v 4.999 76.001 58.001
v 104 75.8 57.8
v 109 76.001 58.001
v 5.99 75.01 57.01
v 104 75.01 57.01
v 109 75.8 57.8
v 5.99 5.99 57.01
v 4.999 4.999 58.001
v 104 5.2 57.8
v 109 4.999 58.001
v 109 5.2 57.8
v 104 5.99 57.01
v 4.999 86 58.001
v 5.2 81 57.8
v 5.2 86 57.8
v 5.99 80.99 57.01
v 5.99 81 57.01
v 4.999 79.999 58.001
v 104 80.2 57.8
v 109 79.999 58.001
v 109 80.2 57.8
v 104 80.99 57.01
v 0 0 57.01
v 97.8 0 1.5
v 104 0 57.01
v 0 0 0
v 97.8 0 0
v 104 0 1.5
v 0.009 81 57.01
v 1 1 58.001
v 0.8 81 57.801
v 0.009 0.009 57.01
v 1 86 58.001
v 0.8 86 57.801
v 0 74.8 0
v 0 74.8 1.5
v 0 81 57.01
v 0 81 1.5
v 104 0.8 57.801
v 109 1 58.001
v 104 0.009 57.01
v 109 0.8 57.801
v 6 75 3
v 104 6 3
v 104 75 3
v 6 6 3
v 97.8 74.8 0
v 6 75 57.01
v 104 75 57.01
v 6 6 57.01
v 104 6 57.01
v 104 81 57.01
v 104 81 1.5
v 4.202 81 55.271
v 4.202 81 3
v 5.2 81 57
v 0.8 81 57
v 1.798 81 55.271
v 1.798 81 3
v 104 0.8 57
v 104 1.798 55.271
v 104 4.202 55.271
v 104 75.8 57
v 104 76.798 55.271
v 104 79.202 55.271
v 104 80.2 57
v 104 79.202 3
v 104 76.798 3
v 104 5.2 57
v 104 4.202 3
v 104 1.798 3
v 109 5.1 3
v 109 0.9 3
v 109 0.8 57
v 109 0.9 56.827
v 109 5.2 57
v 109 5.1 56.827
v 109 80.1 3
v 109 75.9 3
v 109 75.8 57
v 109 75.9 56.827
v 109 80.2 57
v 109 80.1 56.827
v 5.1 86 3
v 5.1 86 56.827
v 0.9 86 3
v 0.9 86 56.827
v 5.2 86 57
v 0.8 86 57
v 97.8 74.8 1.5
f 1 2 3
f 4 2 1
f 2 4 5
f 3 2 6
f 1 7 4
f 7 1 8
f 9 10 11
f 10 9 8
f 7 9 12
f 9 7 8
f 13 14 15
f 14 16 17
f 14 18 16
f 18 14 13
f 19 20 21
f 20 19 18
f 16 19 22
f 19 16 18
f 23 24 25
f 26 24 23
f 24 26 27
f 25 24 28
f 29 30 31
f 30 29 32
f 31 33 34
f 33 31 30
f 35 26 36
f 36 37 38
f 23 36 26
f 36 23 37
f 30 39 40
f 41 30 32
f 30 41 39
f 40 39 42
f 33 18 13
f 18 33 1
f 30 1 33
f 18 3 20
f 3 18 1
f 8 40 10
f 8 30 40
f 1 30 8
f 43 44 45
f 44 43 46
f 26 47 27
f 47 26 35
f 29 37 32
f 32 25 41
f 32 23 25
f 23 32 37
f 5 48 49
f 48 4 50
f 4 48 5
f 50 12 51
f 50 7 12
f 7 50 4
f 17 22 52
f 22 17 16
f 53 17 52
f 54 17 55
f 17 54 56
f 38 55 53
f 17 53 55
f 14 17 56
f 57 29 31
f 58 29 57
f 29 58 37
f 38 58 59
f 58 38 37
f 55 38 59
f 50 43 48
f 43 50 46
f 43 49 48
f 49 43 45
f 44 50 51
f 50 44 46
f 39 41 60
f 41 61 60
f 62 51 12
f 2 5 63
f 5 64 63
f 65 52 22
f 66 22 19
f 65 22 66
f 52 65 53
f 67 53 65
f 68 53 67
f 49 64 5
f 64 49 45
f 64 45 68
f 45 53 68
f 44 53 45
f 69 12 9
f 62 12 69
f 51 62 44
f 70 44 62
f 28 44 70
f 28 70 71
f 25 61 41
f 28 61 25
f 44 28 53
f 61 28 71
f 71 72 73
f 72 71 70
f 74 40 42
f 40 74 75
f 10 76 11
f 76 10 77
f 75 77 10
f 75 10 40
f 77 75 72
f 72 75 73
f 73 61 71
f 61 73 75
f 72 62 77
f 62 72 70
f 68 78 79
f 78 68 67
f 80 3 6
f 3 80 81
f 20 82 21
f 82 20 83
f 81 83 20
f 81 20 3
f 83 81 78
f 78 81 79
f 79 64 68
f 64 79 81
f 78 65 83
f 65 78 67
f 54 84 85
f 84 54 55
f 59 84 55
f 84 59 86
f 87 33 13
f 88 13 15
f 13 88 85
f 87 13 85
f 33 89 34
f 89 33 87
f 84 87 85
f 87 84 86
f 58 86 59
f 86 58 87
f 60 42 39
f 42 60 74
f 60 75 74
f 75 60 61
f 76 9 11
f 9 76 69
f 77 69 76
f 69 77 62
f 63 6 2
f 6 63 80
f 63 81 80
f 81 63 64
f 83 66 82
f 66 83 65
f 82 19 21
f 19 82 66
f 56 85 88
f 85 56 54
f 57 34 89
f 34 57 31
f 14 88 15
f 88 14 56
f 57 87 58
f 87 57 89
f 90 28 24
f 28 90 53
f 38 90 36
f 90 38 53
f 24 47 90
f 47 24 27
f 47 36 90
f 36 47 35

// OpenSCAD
// ============================================================================
// cutlery_box.scad
// Graduated 3-chamber disposable-cutlery box (Option 3) — CUT-FROM-SOLID port
// of build_box.py, for a 120 x 120 x 120 mm printer (AOSEED).
//
// WHY THIS PORT EXISTS (the whole point):
//   The hand-mesh generator (build_box.py) could not keep the 1 mm rim chamfer
//   continuous across the female dovetail joints, because where a slot's flared
//   corner crosses the sloped chamfer it needs a true boolean intersection.
//   OpenSCAD HAS that boolean kernel, so here we do exactly the "cut-from-solid"
//   thing:
//      1. Build the ENTIRE box as ONE solid, WITH the chamfer already on it.
//      2. difference() out vertical dovetail prisms ( /_\ cross-section ),
//         running from just above the base plate up THROUGH the rim, to both
//         (a) form the sliding-dovetail joints, and
//         (b) split the box into 6 bed-sized pieces.
//   Because the cut is a real boolean through the already-chamfered solid, the
//   sloped chamfer<->slot edge is produced for free => the rim chamfer stays
//   CONTINUOUS across every joint, with none of the sliver hacks.
//
// ----------------------------------------------------------------------------
// HOW TO USE
//   In the app:  set `part` below (or use the Customizer dropdown), F5 to
//                preview, F6 to render, then File > Export > STL.
//   One piece (CLI):
//      openscad -o body_knife_A.stl -D 'part="knife_A"' cutlery_box.scad
//   ALL SIX (bash, run from this folder):
//      for p in knife_A knife_B fork_A fork_B spoon_A spoon_B; do \
//        openscad -o "body_$p.stl" -D "part=\"$p\"" cutlery_box.scad ; done
//   PNG preview of one piece:
//      openscad -o knife_B.png --imgsize=1400,1000 --autocenter --viewall \
//        -D 'part="knife_B"' cutlery_box.scad
//
//   Pieces are modelled in ASSEMBLED coordinates (floor-down, z=0 is the bed),
//   so importing all six STLs together shows the assembled box directly; your
//   slicer will auto-drop each one onto the plate for printing.
//
// BED SANITY: every piece is <= 120 mm in X, Y, Z.
//   Z = 58 mm. Widest piece = spoon at 117 mm (Y). A-halves reach 109 mm (X,
//   including the protruding dovetail key). All under 120.
//
// !! I could NOT run OpenSCAD to verify this file (no binary in my sandbox) !!
//   - The rim chamfer is a SMOOTH, true-45 bevel built from hull() frustums of
//     convex rectangles. Works in every OpenSCAD since ~2015 (incl. Homebrew
//     2021.01). No stepped staircase -- and, crucially, it makes box() a clean
//     well-formed solid so the per-part booleans resolve reliably (the old
//     14-slice staircase was fragile and CGAL was dropping the walls of the
//     interior parts, leaving only the key prisms => "floating boxes").
//   - roof() is still available behind USE_ROOF=true for those who have it
//     (2021.01+ snapshots); for THIS rectangular design it is identical, so it
//     is NOT required.
//   - After F6, check the console for "WARNING"/"not a valid 2-manifold".
//     If a tenon ever looks detached, bump EPS to 0.05.
// ============================================================================


/* [Part to render / export] */
part = "knife_A"; // [knife_A, knife_B, fork_A, fork_B, spoon_A, spoon_B, assembly]

/* [Chamfer method] */
// false = smooth hull() frustum bevel (default, any OpenSCAD); true = roof() (2021.01+)
USE_ROOF = false;

/* [Heights (mm)] */
BASE   = 3.0;     // floor / base-plate thickness
COMP_H = 55.0;    // interior wall height above the floor (cutlery stack depth)

/* [Walls (mm)] */
HOST_T   = 6.0;     // thickness of every wall (thick enough to host a dovetail)
HALF_LEN = 104.0;   // printed length of each half (A = near, B = far); <120 incl. key

/* [Chamber bays (mm)] */
N_COL     = 3;       // columns of cutlery per chamber
KNIFE_COL = 23.0;    // -> knife bay 69  (3 x 19 mm knives + play)
FORK_COL  = 33.0;    // -> fork  bay 99  (3 x 29 mm forks  + play)
SPOON_COL = 37.0;    // -> spoon bay 111 (3 x 34 mm spoons + play, trimmed <120)

/* [Dovetail joint (mm)] */
DT_DEPTH = 5.0;   // tail protrusion past the seam (male key depth)
DT_NECK  = 1.2;   // half-width at the seam face (narrow)
DT_FLARE = 2.1;   // half-width at the tip (wide -> locks)
DT_CLR   = 0.4;   // FLANK/seam slide clearance added to the female socket (do not change for fit)
DT_DEPTH_RELIEF = 0.3; // extra depth on the socket BACK only, so the tail tip never bottoms out

/* [Hidden-dovetail top cap / "hat" (mm)] */
// The dovetail otherwise shows its trapezoid outline on the TOP edge of the wall.
// To hide it, the MALE piece extends the wall's full-width top (chamfer included)
// across the key footprint -> a flush, continuous top. The FEMALE piece gets a
// matching top RECESS (cap footprint + CAP_CLR) so the cap drops straight in.
// Result: the top reads as one surface with a single straight seam line at the cap
// tip; the dovetail joinery lives entirely below the cap.
//
// SELF-SUPPORTING UNDERSIDE: a full-width cap would overhang the narrower dovetail
// neck with a flat 90-deg shelf -> needs print support floor-down. Instead the cap
// underside RAMPS from the neck half-width (CAP_FOOT) out to its max half-width at
// CAP_SLANT_DEG from horizontal (steeper = more vertical = safer overhang). The
// FEMALE recess gets the SAME ramp (+CAP_CLR) so the cap still seats flush.
//
// ORANGE refinement: the ramp is sized so it reaches full width EXACTLY at the lower
//   chamfer line (z = BODY_H-CHAMFER). CAP_H is therefore DERIVED (see below), not set
//   here, so the "ramp top" and "chamfer base" reference lines coincide (one less step).
// GREEN refinement: the cap does NOT run to the full wall edge. It stops FEATHER_MIN+
//   CAP_CLR short, so the FEMALE keeps a >= FEATHER_MIN solid land at the wall face
//   instead of feathering to a zero-thickness knife edge. The cap is relieved to match,
//   so it still seats with CAP_CLR.
CAP_SLANT_DEG = 60;     // cap underside ramp angle from horizontal (45 = printable limit; 60 = safe margin)
CAP_FOOT = DT_NECK;     // cap-underside half-width where it meets the dovetail neck
CAP_CLR = 0.3;          // slide clearance so the male cap seats into the female top recess
FEATHER_MIN = 0.5;      // min female wall land left at the joint (kills the knife/feather edge)

/* [Rim chamfer (mm)] */
CHAMFER = 1.0;    // 45-deg comfort break broken along the top wall edges

/* [Base half-lap / anti-warp (mm)] */
// Neighbouring base plates overlap as a HORIZONTAL half-lap (shiplap) at mid-base
// height, so corners stay coplanar (no lift/protrusion). Horizontal lap faces do
// NOT bind the vertical-drop assembly. Shingle direction: A->B and knife->fork->spoon.
LAP_LEN = 6;        // overlap past the A/B seam and the knife/fork seam
LAP_LEN_FS = 2;     // overlap past the fork/SPOON seam -- SMALLER: spoon is the
                    // tightest piece (117mm of the 120mm bed); a 6mm lap there
                    // would push spoon to 123mm. 2mm keeps spoon at 119mm.
LAP_Z   = BASE/2;   // 1.5 -- horizontal split height of the lap (bottom vs top half)
LAP_CLR = 0.2;      // in-plane clearance so the shelf isn't a press fit


/* [Hidden] */
EPS      = 0.01;          // tiny overlap so abutting solids fuse cleanly in CGAL
// Upper-chamber pieces (fork, spoon) were cut by a cell plane laid EXACTLY on the
// divider wall's far face (the lower chamber owns that wall). intersection() along a
// plane coincident with an existing box face makes CGAL leave a ZERO-THICKNESS copy
// of the wall face -> edge-manifold + "watertight" but degenerate (OpenSCAD shows it
// as a blue back-face; Tinkercad thickens it into a phantom block). SEAM_EPS nudges
// those cut planes a hair INTO the open bay so they no longer coincide with any box
// face -> no flap. 0.02 mm is physically nothing but is well clear of CGAL's tolerance.
SEAM_EPS = 0.02;
CUT_OVER = 1.0;           // how far dovetail cutters overshoot the rim (clean cut)

BODY_H    = BASE + COMP_H;     // 58  total height
END_WALL  = HOST_T;            // end walls are dovetail hosts too -> equally thick
TOTAL_LEN = 2 * HALF_LEN;      // 208 assembled length (end wall .. end wall)

// hidden-cap ramp geometry (derived).
//   CAP_HW    = cap MAX half-width. GREEN: stops FEATHER_MIN+CAP_CLR short of the wall
//               edge so the female keeps a >=FEATHER_MIN solid land (no feather edge).
//   CAP_RISE  = vertical height of the self-supporting 60-deg underside ramp.
//   CAP_ZRAMP = where the cap reaches full width. ORANGE: pinned to the chamfer base
//               (BODY_H-CHAMFER) so "ramp top" and "chamfer base" are the SAME line.
//   CAP_ZBOT  = cap bottom = ramp start; CAP_H derived from it (for reference/report).
//   CAP_ZRAMP_R = recess ramp top, shifted down by CAP_CLR so the recess ramp stays
//               parallel to the cap ramp with uniform clearance.
CAP_HW      = HOST_T/2 - FEATHER_MIN - CAP_CLR;
CAP_RISE    = (CAP_HW - CAP_FOOT) * tan(CAP_SLANT_DEG);
CAP_ZRAMP   = BODY_H - CHAMFER;               // ORANGE: full width exactly at the chamfer base
CAP_ZBOT    = CAP_ZRAMP - CAP_RISE;
CAP_H       = BODY_H - CAP_ZBOT;              // derived; reported
CAP_ZRAMP_R = (CAP_ZBOT - CAP_CLR) + CAP_RISE;
// sanity checks
assert(CAP_ZBOT > BASE + 1,
       "cap zone dips too low -- reduce CAP_SLANT_DEG or FEATHER_MIN");
assert(CAP_HW >= DT_FLARE,
       "cap too narrow to cover the dovetail tail -- reduce FEATHER_MIN or CAP_CLR");

// bay widths
KNIFE_BAY = N_COL * KNIFE_COL; // 69
FORK_BAY  = N_COL * FORK_COL;  // 99
SPOON_BAY = N_COL * SPOON_COL; // 111

// ---- Y layout (width direction): wall | bay | divider | bay | divider | bay | wall
KNIFE_Y0 = 0;
KNIFE_Y1 = HOST_T + KNIFE_BAY + HOST_T;        // 0..81   (outer wall + bay + divider)
FORK_Y0  = KNIFE_Y1;                           // 81
FORK_Y1  = FORK_Y0 + FORK_BAY + HOST_T;        // 81..186 (bay + divider)
SPOON_Y0 = FORK_Y1;                            // 186
SPOON_Y1 = SPOON_Y0 + SPOON_BAY + HOST_T;      // 186..303(bay + outer wall)
EXT_W    = SPOON_Y1;                           // 303 total width

// lengthwise wall Y-bands [y0,y1] (host the A/B dovetails) + their centers
OUTER_L  = [0, HOST_T];                                       // [0,6]    c=3
DIV_KF   = [HOST_T + KNIFE_BAY, HOST_T + KNIFE_BAY + HOST_T]; // [75,81]  c=78
DIV_FS   = [FORK_Y0 + FORK_BAY, FORK_Y0 + FORK_BAY + HOST_T]; // [180,186]c=183
OUTER_R  = [SPOON_Y1 - HOST_T, SPOON_Y1];                     // [297,303]c=300

// the three OPEN bays are rectangular holes in the wall footprint:
//   footprint = outer rectangle MINUS these bays  (== the 6 walls; verified).
// The smooth chamfer is built from exactly this decomposition.
BAY_X0 = END_WALL;              // 6
BAY_X1 = TOTAL_LEN - END_WALL;  // 202
BAYS = [
    [BAY_X0, BAY_X1, HOST_T,   HOST_T + KNIFE_BAY],   // knife bay [6,202] x [6,75]
    [BAY_X0, BAY_X1, FORK_Y0,  FORK_Y0 + FORK_BAY],   // fork  bay [6,202] x [81,180]
    [BAY_X0, BAY_X1, SPOON_Y0, SPOON_Y0 + SPOON_BAY], // spoon bay [6,202] x [186,297]
];

YC_OUTL  = OUTER_L[0] + HOST_T/2;   // 3   outer-left wall center
YC_DIVKF = DIV_KF[0]  + HOST_T/2;   // 78  knife/fork divider center
YC_DIVFS = DIV_FS[0]  + HOST_T/2;   // 183 fork/spoon divider center
YC_OUTR  = OUTER_R[0] + HOST_T/2;   // 300 outer-right wall center

// seams
AB_SEAM = HALF_LEN;               // 104  A/B length seam (x)
SEAM_KF = FORK_Y0;                // 81   knife/fork width seam (y)
SEAM_FS = SPOON_Y0;              // 186  fork/spoon width seam (y)
ENDC_A  = END_WALL/2;             // 3    A end-wall center (x) -> chamber dovetails
ENDC_B  = TOTAL_LEN - END_WALL/2; // 205  B end-wall center (x)


// ============================================================================
// 2D wall footprint (cross-section of all walls, constant in z for the straight
// part). Union of: 2 full-width end walls + 4 lengthwise walls between them.
// ============================================================================
module wall_footprint_2d() {
    // footprint = outer rectangle minus the 3 open bays  (== the 6 walls)
    difference() {
        square([TOTAL_LEN, EXT_W]);
        for (b = BAYS) translate([b[0], b[2]]) square([b[1] - b[0], b[3] - b[2]]);
    }
}

// ============================================================================
// The full chamfered box solid = base plate + walls with a continuous 1 mm
// top-rim chamfer. Built ONCE; every piece is carved out of this.
// ============================================================================
module chamfer_cap() {
    // SMOOTH 45 rim chamfer over z[BODY_H-CHAMFER, BODY_H], in absolute coords.
    zm = BODY_H - CHAMFER;
    if (USE_ROOF) {
        // exact straight-skeleton roof, capped at CHAMFER height (needs roof()).
        intersection() {
            translate([0,0,zm]) roof() wall_footprint_2d();
            translate([0,0,zm]) linear_extrude(CHAMFER + EPS) wall_footprint_2d();
        }
    } else {
        // DEFAULT: true 45 bevel as hull() frustums of CONVEX rectangles -> smooth
        // AND a clean manifold.  Since footprint = outer - bays, the chamfer of the
        // footprint = (outer rectangle beveled inward) MINUS (each bay beveled so it
        // grows toward the top, which bevels every bay-facing rim).  All hull()s are
        // on convex rectangles, so nothing gets convex-filled.
        difference() {
            // outer perimeter frustum: full outer rect at zm -> inset by CHAMFER at top
            hull() {
                translate([0,0,zm])     linear_extrude(0.001) square([TOTAL_LEN, EXT_W]);
                translate([0,0,BODY_H]) linear_extrude(0.001) offset(delta=-CHAMFER) square([TOTAL_LEN, EXT_W]);
            }
            // each bay grows by CHAMFER toward the top -> bevels its surrounding rim.
            // (overshoots z a hair past both ends so the cut is clean.)
            for (b = BAYS)
                hull() {
                    translate([0,0,zm-EPS])     linear_extrude(0.001)
                        translate([b[0],b[2]]) offset(delta=-EPS)        square([b[1]-b[0], b[3]-b[2]]);
                    translate([0,0,BODY_H+EPS]) linear_extrude(0.001)
                        translate([b[0],b[2]]) offset(delta=CHAMFER+EPS) square([b[1]-b[0], b[3]-b[2]]);
                }
        }
    }
}

module box() {
    zm = BODY_H - CHAMFER;
    union() {
        cube([TOTAL_LEN, EXT_W, BASE]);                                        // base plate z[0,3]
        translate([0,0,BASE]) linear_extrude(zm - BASE + EPS) wall_footprint_2d(); // straight walls z[3,57]
        chamfer_cap();                                                         // smooth chamfer z[57,58]
    }
}

// ============================================================================
// Dovetail prisms ( /_\ ). Vertical, z[BASE, BODY_H+CUT_OVER] so they cut
// through the rim but leave the base plate continuous. The near face is pushed
// back EPS so a male key always fuses to its wall.
//   male key   : half_n=DT_NECK,         half_f=DT_FLARE
//   female slot: half_n=DT_NECK+DT_CLR,  half_f=DT_FLARE+DT_CLR
// ============================================================================
module dt_prism_X(seam_x, yc, half_n, half_f) {   // perpendicular to X, grows +X
    translate([0,0,BASE]) linear_extrude(BODY_H - BASE + CUT_OVER)
        polygon([[seam_x - EPS,        yc - half_n],
                 [seam_x + DT_DEPTH,   yc - half_f],
                 [seam_x + DT_DEPTH,   yc + half_f],
                 [seam_x - EPS,        yc + half_n]]);
}
module dt_prism_Y(seam_y, xc, half_n, half_f) {   // perpendicular to Y, grows +Y
    translate([0,0,BASE]) linear_extrude(BODY_H - BASE + CUT_OVER)
        polygon([[xc - half_n, seam_y - EPS],
                 [xc - half_f, seam_y + DT_DEPTH],
                 [xc + half_f, seam_y + DT_DEPTH],
                 [xc + half_n, seam_y - EPS]]);
}
module ab_key   (yc)        { dt_prism_X(AB_SEAM, yc, DT_NECK, DT_FLARE); }
module ch_key   (seam_y, xc){ dt_prism_Y(seam_y, xc, DT_NECK, DT_FLARE); }

// Female sockets = male + DT_CLR on the flanks/seam (unchanged), PLUS a straight
// back-face relief of DT_DEPTH_RELIEF so the tail tip never bottoms out. The
// relief is a rectangle tacked onto the trapezoid's tip at the SAME flare width,
// so the angled flank faces (and their 0.4 mm slide clearance) are untouched.
module ab_socket(yc) {
    dt_prism_X(AB_SEAM, yc, DT_NECK + DT_CLR, DT_FLARE + DT_CLR);
    translate([0,0,BASE]) linear_extrude(BODY_H - BASE + CUT_OVER)
        translate([AB_SEAM + DT_DEPTH, yc - (DT_FLARE + DT_CLR)])
            square([DT_DEPTH_RELIEF, 2*(DT_FLARE + DT_CLR)]);          // back relief, +X
}
module ch_socket(seam_y, xc) {
    dt_prism_Y(seam_y, xc, DT_NECK + DT_CLR, DT_FLARE + DT_CLR);
    translate([0,0,BASE]) linear_extrude(BODY_H - BASE + CUT_OVER)
        translate([xc - (DT_FLARE + DT_CLR), seam_y + DT_DEPTH])
            square([2*(DT_FLARE + DT_CLR), DT_DEPTH_RELIEF]);          // back relief, +Y
}

// ===== hidden-dovetail top cap ("hat"), SELF-SUPPORTING underside ===============
// MALE cap: a NARROW hat (max half-width CAP_HW = HOST_T/2 - FEATHER_MIN - CAP_CLR) whose
// underside RAMPS from the dovetail-neck half-width (CAP_FOOT) out to CAP_HW at
// CAP_SLANT_DEG from horizontal -> a self-supporting shoulder (the "orange" edge). The
// ramp tops out at CAP_ZRAMP = BODY_H - CHAMFER (= the lower chamfer line), so the
// "ramp top" and "chamfer base" reference lines coincide ("merge C into B"). Built as
// hull(narrow bottom slab buried in the tail neck, top slab at CAP_HW through the rim);
// box() trims it to the wall and adds the rim chamfer. Staying narrow leaves a clean
// FEATHER_MIN female land (no knife edge). The protruding NOSE is left SQUARE (vertical) --
// intentionally simple; it is hidden in the female socket when assembled.
module ab_cap(yc) {   // A/B seam, grows +X past the seam (length direction)
    hull() {
        translate([AB_SEAM - EPS, yc - CAP_FOOT, CAP_ZBOT])
            cube([DT_DEPTH + EPS, 2*CAP_FOOT, EPS]);
        translate([AB_SEAM - EPS, yc - CAP_HW,   CAP_ZRAMP])
            cube([DT_DEPTH + EPS, 2*CAP_HW, (BODY_H + CUT_OVER) - CAP_ZRAMP]);
    }
}
module ch_cap(seam_y, xc) {   // chamber seam, grows +Y past the seam (in the end wall)
    hull() {
        translate([xc - CAP_FOOT, seam_y - EPS, CAP_ZBOT])
            cube([2*CAP_FOOT, DT_DEPTH + EPS, EPS]);
        translate([xc - CAP_HW,   seam_y - EPS, CAP_ZRAMP])
            cube([2*CAP_HW, DT_DEPTH + EPS, (BODY_H + CUT_OVER) - CAP_ZRAMP]);
    }
}
// FEMALE recess: the SAME ramp grown by CAP_CLR (flanks, tip, floor, and ramp shifted down
// by CAP_CLR so it stays parallel) -> the cap seats with uniform slide clearance, the wall
// keeps a >= FEATHER_MIN solid land at the joint (no feather edge), and there are no
// coincident faces. Open upward and toward the seam.
module ab_cap_neg(yc) {
    hull() {
        translate([AB_SEAM - EPS, yc - (CAP_FOOT + CAP_CLR), CAP_ZBOT - CAP_CLR])
            cube([DT_DEPTH + CAP_CLR + EPS, 2*(CAP_FOOT + CAP_CLR), EPS]);
        translate([AB_SEAM - EPS, yc - (CAP_HW + CAP_CLR), CAP_ZRAMP_R])
            cube([DT_DEPTH + CAP_CLR + EPS, 2*(CAP_HW + CAP_CLR), (BODY_H + CUT_OVER + 1) - CAP_ZRAMP_R]);
    }
}
module ch_cap_neg(seam_y, xc) {
    hull() {
        translate([xc - (CAP_FOOT + CAP_CLR), seam_y - EPS, CAP_ZBOT - CAP_CLR])
            cube([2*(CAP_FOOT + CAP_CLR), DT_DEPTH + CAP_CLR + EPS, EPS]);
        translate([xc - (CAP_HW + CAP_CLR), seam_y - EPS, CAP_ZRAMP_R])
            cube([2*(CAP_HW + CAP_CLR), DT_DEPTH + CAP_CLR + EPS, (BODY_H + CUT_OVER + 1) - CAP_ZRAMP_R]);
    }
}

// rectangular cell (x[xa,xb], y[ya,yb], full height + margin) used to split pieces
module cell(xa, xb, ya, yb) {
    translate([xa, ya, -1]) cube([xb - xa, yb - ya, BODY_H + 11]);
}

// ===== base half-lap (shiplap) =================================================
// HORIZONTAL lap at mid-base height: the shelf-owner keeps its BOTTOM half
// (z 0..LAP_Z) extending LAP_LEN past the seam; the neighbour has its bottom half
// REMOVED there (keeps only the top half) and lands flat on the shelf. Horizontal
// faces => no binding during the vertical drop. Shelves live entirely in the base
// (z < BASE), well clear of the wall dovetails (z >= BASE).
// Shingle = FEMALE-first (matches the no-notch dovetail assembly order, which
// lowers the male piece onto the female): the B half owns the A/B shelf (grows
// -X into A) and the UPPER chamber (fork, spoon) owns the chamber shelf (grows
// -Y into the lower chamber).  Order: spoon, fork, knife; B before A.
module lap_shelf_X(y0, y1) {                 // B-side shelf, grows -X into A past AB_SEAM
    // +EPS past AB_SEAM so the shelf interpenetrates (not just abuts) its own B body -> fuses cleanly.
    translate([AB_SEAM - LAP_LEN, y0, 0]) cube([LAP_LEN + EPS, y1 - y0, LAP_Z]);
}
module lap_neg_X(y0, y1) {                   // A-side: remove bottom half to receive it
    translate([AB_SEAM - LAP_LEN - LAP_CLR, y0 - EPS, -EPS])
        cube([LAP_LEN + LAP_CLR + EPS, (y1 - y0) + 2*EPS, LAP_Z + EPS]);
}
module lap_shelf_Y(seam_y, x0, x1, ln=LAP_LEN) {   // upper-chamber shelf, grows -Y into lower
    // grows -Y by `ln` into the lower chamber AND +Y by 2*SEAM_EPS past the seam so it
    // always overlaps the (SEAM_EPS-nudged) body floor and stays fused -> no floating shelf.
    translate([x0, seam_y - ln, 0]) cube([x1 - x0, ln + 2*SEAM_EPS, LAP_Z]);
}
module lap_neg_Y(seam_y, x0, x1, ln=LAP_LEN) {     // lower-chamber: remove bottom half
    translate([x0 - EPS, seam_y - ln - LAP_CLR, -EPS])
        cube([(x1 - x0) + 2*EPS, ln + LAP_CLR + EPS, LAP_Z + EPS]);
}

// ============================================================================
// The six pieces.  piece = intersection(box, cell + own male keys) - own sockets
//   A halves are MALE on the A/B seam (keep the key); B halves are FEMALE (slot).
//   On a chamber seam the LEFT chamber is male (+Y), the right chamber is female.
// ============================================================================
// Base half-lap shingling (FEMALE-first, Option 1):
//   A/B seam  -> the B half owns the bottom shelf (grows -X), A has the negative.
//   chamber   -> the UPPER chamber (fork, spoon) owns the shelf (grows -Y); the
//                lower chamber (knife, fork) has the negative.
//   Assembly order: spoon, fork, knife; B before A (male lowered onto female).
// Center crossings (104,81)&(104,186): the CHAMBER shelf (fork_A / spoon_A) owns the
//   crossing square; the B-half A/B shelf (knife_B / fork_B) is CLIPPED short of the
//   chamber seam by LAP_LEN so two shelves never collide.
module knife_A() {                                       // placed LAST; receives everything
    difference() {
        intersection() {
            box();
            union() {
                cell(-1, AB_SEAM, KNIFE_Y0 - 1, KNIFE_Y1);
                ab_key(YC_OUTL); ab_key(YC_DIVKF); ch_key(SEAM_KF, ENDC_A);
                ab_cap(YC_OUTL); ab_cap(YC_DIVKF); ch_cap(SEAM_KF, ENDC_A);  // hide tops (male)
            }
        }
        lap_neg_X(KNIFE_Y0, KNIFE_Y1);            // receive knife_B's A/B shelf
        lap_neg_Y(SEAM_KF, 0, AB_SEAM);           // receive fork_A's chamber shelf
    }
}

module knife_B() {
    difference() {
        union() {
            intersection() {
                box();
                union() {
                    cell(AB_SEAM, TOTAL_LEN + 1, KNIFE_Y0 - 1, KNIFE_Y1);
                    ch_key(SEAM_KF, ENDC_B);
                    ch_cap(SEAM_KF, ENDC_B);                // hide top (male, chamber)
                }
            }
            lap_shelf_X(KNIFE_Y0, KNIFE_Y1 - LAP_LEN);  // A/B shelf -> knife_A (CLIPPED at y=81 crossing)
        }
        ab_socket(YC_OUTL); ab_socket(YC_DIVKF);
        ab_cap_neg(YC_OUTL); ab_cap_neg(YC_DIVKF);      // top recesses to receive knife_A's caps (female)
        lap_neg_Y(SEAM_KF, AB_SEAM, TOTAL_LEN);         // receive fork_B's chamber shelf
    }
}

module fork_A() {
    difference() {
        union() {
            intersection() {
                box();
                union() {
                    cell(-1, AB_SEAM, FORK_Y0 + SEAM_EPS, FORK_Y1);  // -Y cut nudged off the divider face
                    ab_key(YC_DIVFS); ch_key(SEAM_FS, ENDC_A);
                    ab_cap(YC_DIVFS); ch_cap(SEAM_FS, ENDC_A);       // hide tops (male)
                }
            }
            lap_shelf_Y(SEAM_KF, 0, AB_SEAM);           // chamber shelf -> knife_A (owns crossing)
        }
        lap_neg_X(FORK_Y0, FORK_Y1);                    // receive fork_B's A/B shelf
        ch_socket(SEAM_KF, ENDC_A);
        ch_cap_neg(SEAM_KF, ENDC_A);                    // top recess to receive knife_A's chamber cap (female)
        lap_neg_Y(SEAM_FS, 0, AB_SEAM, LAP_LEN_FS);     // receive spoon_A's (small) chamber shelf
    }
}

module fork_B() {
    difference() {
        union() {
            intersection() {
                box();
                union() {
                    cell(AB_SEAM, TOTAL_LEN + 1, FORK_Y0 + SEAM_EPS, FORK_Y1);  // -Y cut nudged off the divider face
                    ch_key(SEAM_FS, ENDC_B);
                    ch_cap(SEAM_FS, ENDC_B);                // hide top (male, chamber)
                }
            }
            lap_shelf_X(FORK_Y0, FORK_Y1 - LAP_LEN_FS); // A/B shelf -> fork_A (CLIPPED at y=186 crossing)
            lap_shelf_Y(SEAM_KF, AB_SEAM, TOTAL_LEN);   // chamber shelf -> knife_B
        }
        ab_socket(YC_DIVFS);
        ab_cap_neg(YC_DIVFS);                           // top recess to receive fork_A's A/B cap (female)
        ch_socket(SEAM_KF, ENDC_B);
        ch_cap_neg(SEAM_KF, ENDC_B);                    // top recess to receive knife_B's chamber cap (female)
        lap_neg_Y(SEAM_FS, AB_SEAM, TOTAL_LEN, LAP_LEN_FS); // receive spoon_B's (small) chamber shelf
    }
}

module spoon_A() {
    difference() {
        union() {
            intersection() {
                box();
                union() {
                    cell(-1, AB_SEAM, SPOON_Y0 + SEAM_EPS, SPOON_Y1 + 1);  // -Y cut nudged off the divider face
                    ab_key(YC_OUTR);
                    ab_cap(YC_OUTR);                        // hide top (male)
                }
            }
            lap_shelf_Y(SEAM_FS, 0, AB_SEAM, LAP_LEN_FS); // chamber shelf -> fork_A (small; owns crossing)
        }
        lap_neg_X(SPOON_Y0, SPOON_Y1);                  // receive spoon_B's A/B shelf
        ch_socket(SEAM_FS, ENDC_A);
        ch_cap_neg(SEAM_FS, ENDC_A);                    // top recess to receive fork_A's chamber cap (female)
    }
}

module spoon_B() {                                      // placed FIRST; owns shelves
    difference() {
        union() {
            intersection() {
                box();
                union() {
                    cell(AB_SEAM, TOTAL_LEN + 1, SPOON_Y0 + SEAM_EPS, SPOON_Y1 + 1);  // -Y cut nudged off the divider face
                }
            }
            lap_shelf_X(SPOON_Y0, SPOON_Y1);            // A/B shelf -> spoon_A
            lap_shelf_Y(SEAM_FS, AB_SEAM, TOTAL_LEN, LAP_LEN_FS); // chamber shelf -> fork_B (small)
        }
        ab_socket(YC_OUTR);
        ab_cap_neg(YC_OUTR);                            // top recess to receive spoon_A's A/B cap (female)
        ch_socket(SEAM_FS, ENDC_B);
        ch_cap_neg(SEAM_FS, ENDC_B);                    // top recess to receive fork_B's chamber cap (female)
    }
}

// Fast preview: the full continuous-chamfer box (no cuts). The six part modules
// above are the real, separable pieces. To instead see the TRUE assembled
// pieces with their joints (slower — 6 booleans), replace box(); below with:
//   knife_A(); knife_B(); fork_A(); fork_B(); spoon_A(); spoon_B();
module assembly() {
    box();
}

// ============================================================================
// Render dispatch
// ============================================================================
if      (part == "knife_A")  knife_A();
else if (part == "knife_B")  knife_B();
else if (part == "fork_A")   fork_A();
else if (part == "fork_B")   fork_B();
else if (part == "spoon_A")  spoon_A();
else if (part == "spoon_B")  spoon_B();
else if (part == "assembly") assembly();
else echo(str("Unknown part: ", part));
